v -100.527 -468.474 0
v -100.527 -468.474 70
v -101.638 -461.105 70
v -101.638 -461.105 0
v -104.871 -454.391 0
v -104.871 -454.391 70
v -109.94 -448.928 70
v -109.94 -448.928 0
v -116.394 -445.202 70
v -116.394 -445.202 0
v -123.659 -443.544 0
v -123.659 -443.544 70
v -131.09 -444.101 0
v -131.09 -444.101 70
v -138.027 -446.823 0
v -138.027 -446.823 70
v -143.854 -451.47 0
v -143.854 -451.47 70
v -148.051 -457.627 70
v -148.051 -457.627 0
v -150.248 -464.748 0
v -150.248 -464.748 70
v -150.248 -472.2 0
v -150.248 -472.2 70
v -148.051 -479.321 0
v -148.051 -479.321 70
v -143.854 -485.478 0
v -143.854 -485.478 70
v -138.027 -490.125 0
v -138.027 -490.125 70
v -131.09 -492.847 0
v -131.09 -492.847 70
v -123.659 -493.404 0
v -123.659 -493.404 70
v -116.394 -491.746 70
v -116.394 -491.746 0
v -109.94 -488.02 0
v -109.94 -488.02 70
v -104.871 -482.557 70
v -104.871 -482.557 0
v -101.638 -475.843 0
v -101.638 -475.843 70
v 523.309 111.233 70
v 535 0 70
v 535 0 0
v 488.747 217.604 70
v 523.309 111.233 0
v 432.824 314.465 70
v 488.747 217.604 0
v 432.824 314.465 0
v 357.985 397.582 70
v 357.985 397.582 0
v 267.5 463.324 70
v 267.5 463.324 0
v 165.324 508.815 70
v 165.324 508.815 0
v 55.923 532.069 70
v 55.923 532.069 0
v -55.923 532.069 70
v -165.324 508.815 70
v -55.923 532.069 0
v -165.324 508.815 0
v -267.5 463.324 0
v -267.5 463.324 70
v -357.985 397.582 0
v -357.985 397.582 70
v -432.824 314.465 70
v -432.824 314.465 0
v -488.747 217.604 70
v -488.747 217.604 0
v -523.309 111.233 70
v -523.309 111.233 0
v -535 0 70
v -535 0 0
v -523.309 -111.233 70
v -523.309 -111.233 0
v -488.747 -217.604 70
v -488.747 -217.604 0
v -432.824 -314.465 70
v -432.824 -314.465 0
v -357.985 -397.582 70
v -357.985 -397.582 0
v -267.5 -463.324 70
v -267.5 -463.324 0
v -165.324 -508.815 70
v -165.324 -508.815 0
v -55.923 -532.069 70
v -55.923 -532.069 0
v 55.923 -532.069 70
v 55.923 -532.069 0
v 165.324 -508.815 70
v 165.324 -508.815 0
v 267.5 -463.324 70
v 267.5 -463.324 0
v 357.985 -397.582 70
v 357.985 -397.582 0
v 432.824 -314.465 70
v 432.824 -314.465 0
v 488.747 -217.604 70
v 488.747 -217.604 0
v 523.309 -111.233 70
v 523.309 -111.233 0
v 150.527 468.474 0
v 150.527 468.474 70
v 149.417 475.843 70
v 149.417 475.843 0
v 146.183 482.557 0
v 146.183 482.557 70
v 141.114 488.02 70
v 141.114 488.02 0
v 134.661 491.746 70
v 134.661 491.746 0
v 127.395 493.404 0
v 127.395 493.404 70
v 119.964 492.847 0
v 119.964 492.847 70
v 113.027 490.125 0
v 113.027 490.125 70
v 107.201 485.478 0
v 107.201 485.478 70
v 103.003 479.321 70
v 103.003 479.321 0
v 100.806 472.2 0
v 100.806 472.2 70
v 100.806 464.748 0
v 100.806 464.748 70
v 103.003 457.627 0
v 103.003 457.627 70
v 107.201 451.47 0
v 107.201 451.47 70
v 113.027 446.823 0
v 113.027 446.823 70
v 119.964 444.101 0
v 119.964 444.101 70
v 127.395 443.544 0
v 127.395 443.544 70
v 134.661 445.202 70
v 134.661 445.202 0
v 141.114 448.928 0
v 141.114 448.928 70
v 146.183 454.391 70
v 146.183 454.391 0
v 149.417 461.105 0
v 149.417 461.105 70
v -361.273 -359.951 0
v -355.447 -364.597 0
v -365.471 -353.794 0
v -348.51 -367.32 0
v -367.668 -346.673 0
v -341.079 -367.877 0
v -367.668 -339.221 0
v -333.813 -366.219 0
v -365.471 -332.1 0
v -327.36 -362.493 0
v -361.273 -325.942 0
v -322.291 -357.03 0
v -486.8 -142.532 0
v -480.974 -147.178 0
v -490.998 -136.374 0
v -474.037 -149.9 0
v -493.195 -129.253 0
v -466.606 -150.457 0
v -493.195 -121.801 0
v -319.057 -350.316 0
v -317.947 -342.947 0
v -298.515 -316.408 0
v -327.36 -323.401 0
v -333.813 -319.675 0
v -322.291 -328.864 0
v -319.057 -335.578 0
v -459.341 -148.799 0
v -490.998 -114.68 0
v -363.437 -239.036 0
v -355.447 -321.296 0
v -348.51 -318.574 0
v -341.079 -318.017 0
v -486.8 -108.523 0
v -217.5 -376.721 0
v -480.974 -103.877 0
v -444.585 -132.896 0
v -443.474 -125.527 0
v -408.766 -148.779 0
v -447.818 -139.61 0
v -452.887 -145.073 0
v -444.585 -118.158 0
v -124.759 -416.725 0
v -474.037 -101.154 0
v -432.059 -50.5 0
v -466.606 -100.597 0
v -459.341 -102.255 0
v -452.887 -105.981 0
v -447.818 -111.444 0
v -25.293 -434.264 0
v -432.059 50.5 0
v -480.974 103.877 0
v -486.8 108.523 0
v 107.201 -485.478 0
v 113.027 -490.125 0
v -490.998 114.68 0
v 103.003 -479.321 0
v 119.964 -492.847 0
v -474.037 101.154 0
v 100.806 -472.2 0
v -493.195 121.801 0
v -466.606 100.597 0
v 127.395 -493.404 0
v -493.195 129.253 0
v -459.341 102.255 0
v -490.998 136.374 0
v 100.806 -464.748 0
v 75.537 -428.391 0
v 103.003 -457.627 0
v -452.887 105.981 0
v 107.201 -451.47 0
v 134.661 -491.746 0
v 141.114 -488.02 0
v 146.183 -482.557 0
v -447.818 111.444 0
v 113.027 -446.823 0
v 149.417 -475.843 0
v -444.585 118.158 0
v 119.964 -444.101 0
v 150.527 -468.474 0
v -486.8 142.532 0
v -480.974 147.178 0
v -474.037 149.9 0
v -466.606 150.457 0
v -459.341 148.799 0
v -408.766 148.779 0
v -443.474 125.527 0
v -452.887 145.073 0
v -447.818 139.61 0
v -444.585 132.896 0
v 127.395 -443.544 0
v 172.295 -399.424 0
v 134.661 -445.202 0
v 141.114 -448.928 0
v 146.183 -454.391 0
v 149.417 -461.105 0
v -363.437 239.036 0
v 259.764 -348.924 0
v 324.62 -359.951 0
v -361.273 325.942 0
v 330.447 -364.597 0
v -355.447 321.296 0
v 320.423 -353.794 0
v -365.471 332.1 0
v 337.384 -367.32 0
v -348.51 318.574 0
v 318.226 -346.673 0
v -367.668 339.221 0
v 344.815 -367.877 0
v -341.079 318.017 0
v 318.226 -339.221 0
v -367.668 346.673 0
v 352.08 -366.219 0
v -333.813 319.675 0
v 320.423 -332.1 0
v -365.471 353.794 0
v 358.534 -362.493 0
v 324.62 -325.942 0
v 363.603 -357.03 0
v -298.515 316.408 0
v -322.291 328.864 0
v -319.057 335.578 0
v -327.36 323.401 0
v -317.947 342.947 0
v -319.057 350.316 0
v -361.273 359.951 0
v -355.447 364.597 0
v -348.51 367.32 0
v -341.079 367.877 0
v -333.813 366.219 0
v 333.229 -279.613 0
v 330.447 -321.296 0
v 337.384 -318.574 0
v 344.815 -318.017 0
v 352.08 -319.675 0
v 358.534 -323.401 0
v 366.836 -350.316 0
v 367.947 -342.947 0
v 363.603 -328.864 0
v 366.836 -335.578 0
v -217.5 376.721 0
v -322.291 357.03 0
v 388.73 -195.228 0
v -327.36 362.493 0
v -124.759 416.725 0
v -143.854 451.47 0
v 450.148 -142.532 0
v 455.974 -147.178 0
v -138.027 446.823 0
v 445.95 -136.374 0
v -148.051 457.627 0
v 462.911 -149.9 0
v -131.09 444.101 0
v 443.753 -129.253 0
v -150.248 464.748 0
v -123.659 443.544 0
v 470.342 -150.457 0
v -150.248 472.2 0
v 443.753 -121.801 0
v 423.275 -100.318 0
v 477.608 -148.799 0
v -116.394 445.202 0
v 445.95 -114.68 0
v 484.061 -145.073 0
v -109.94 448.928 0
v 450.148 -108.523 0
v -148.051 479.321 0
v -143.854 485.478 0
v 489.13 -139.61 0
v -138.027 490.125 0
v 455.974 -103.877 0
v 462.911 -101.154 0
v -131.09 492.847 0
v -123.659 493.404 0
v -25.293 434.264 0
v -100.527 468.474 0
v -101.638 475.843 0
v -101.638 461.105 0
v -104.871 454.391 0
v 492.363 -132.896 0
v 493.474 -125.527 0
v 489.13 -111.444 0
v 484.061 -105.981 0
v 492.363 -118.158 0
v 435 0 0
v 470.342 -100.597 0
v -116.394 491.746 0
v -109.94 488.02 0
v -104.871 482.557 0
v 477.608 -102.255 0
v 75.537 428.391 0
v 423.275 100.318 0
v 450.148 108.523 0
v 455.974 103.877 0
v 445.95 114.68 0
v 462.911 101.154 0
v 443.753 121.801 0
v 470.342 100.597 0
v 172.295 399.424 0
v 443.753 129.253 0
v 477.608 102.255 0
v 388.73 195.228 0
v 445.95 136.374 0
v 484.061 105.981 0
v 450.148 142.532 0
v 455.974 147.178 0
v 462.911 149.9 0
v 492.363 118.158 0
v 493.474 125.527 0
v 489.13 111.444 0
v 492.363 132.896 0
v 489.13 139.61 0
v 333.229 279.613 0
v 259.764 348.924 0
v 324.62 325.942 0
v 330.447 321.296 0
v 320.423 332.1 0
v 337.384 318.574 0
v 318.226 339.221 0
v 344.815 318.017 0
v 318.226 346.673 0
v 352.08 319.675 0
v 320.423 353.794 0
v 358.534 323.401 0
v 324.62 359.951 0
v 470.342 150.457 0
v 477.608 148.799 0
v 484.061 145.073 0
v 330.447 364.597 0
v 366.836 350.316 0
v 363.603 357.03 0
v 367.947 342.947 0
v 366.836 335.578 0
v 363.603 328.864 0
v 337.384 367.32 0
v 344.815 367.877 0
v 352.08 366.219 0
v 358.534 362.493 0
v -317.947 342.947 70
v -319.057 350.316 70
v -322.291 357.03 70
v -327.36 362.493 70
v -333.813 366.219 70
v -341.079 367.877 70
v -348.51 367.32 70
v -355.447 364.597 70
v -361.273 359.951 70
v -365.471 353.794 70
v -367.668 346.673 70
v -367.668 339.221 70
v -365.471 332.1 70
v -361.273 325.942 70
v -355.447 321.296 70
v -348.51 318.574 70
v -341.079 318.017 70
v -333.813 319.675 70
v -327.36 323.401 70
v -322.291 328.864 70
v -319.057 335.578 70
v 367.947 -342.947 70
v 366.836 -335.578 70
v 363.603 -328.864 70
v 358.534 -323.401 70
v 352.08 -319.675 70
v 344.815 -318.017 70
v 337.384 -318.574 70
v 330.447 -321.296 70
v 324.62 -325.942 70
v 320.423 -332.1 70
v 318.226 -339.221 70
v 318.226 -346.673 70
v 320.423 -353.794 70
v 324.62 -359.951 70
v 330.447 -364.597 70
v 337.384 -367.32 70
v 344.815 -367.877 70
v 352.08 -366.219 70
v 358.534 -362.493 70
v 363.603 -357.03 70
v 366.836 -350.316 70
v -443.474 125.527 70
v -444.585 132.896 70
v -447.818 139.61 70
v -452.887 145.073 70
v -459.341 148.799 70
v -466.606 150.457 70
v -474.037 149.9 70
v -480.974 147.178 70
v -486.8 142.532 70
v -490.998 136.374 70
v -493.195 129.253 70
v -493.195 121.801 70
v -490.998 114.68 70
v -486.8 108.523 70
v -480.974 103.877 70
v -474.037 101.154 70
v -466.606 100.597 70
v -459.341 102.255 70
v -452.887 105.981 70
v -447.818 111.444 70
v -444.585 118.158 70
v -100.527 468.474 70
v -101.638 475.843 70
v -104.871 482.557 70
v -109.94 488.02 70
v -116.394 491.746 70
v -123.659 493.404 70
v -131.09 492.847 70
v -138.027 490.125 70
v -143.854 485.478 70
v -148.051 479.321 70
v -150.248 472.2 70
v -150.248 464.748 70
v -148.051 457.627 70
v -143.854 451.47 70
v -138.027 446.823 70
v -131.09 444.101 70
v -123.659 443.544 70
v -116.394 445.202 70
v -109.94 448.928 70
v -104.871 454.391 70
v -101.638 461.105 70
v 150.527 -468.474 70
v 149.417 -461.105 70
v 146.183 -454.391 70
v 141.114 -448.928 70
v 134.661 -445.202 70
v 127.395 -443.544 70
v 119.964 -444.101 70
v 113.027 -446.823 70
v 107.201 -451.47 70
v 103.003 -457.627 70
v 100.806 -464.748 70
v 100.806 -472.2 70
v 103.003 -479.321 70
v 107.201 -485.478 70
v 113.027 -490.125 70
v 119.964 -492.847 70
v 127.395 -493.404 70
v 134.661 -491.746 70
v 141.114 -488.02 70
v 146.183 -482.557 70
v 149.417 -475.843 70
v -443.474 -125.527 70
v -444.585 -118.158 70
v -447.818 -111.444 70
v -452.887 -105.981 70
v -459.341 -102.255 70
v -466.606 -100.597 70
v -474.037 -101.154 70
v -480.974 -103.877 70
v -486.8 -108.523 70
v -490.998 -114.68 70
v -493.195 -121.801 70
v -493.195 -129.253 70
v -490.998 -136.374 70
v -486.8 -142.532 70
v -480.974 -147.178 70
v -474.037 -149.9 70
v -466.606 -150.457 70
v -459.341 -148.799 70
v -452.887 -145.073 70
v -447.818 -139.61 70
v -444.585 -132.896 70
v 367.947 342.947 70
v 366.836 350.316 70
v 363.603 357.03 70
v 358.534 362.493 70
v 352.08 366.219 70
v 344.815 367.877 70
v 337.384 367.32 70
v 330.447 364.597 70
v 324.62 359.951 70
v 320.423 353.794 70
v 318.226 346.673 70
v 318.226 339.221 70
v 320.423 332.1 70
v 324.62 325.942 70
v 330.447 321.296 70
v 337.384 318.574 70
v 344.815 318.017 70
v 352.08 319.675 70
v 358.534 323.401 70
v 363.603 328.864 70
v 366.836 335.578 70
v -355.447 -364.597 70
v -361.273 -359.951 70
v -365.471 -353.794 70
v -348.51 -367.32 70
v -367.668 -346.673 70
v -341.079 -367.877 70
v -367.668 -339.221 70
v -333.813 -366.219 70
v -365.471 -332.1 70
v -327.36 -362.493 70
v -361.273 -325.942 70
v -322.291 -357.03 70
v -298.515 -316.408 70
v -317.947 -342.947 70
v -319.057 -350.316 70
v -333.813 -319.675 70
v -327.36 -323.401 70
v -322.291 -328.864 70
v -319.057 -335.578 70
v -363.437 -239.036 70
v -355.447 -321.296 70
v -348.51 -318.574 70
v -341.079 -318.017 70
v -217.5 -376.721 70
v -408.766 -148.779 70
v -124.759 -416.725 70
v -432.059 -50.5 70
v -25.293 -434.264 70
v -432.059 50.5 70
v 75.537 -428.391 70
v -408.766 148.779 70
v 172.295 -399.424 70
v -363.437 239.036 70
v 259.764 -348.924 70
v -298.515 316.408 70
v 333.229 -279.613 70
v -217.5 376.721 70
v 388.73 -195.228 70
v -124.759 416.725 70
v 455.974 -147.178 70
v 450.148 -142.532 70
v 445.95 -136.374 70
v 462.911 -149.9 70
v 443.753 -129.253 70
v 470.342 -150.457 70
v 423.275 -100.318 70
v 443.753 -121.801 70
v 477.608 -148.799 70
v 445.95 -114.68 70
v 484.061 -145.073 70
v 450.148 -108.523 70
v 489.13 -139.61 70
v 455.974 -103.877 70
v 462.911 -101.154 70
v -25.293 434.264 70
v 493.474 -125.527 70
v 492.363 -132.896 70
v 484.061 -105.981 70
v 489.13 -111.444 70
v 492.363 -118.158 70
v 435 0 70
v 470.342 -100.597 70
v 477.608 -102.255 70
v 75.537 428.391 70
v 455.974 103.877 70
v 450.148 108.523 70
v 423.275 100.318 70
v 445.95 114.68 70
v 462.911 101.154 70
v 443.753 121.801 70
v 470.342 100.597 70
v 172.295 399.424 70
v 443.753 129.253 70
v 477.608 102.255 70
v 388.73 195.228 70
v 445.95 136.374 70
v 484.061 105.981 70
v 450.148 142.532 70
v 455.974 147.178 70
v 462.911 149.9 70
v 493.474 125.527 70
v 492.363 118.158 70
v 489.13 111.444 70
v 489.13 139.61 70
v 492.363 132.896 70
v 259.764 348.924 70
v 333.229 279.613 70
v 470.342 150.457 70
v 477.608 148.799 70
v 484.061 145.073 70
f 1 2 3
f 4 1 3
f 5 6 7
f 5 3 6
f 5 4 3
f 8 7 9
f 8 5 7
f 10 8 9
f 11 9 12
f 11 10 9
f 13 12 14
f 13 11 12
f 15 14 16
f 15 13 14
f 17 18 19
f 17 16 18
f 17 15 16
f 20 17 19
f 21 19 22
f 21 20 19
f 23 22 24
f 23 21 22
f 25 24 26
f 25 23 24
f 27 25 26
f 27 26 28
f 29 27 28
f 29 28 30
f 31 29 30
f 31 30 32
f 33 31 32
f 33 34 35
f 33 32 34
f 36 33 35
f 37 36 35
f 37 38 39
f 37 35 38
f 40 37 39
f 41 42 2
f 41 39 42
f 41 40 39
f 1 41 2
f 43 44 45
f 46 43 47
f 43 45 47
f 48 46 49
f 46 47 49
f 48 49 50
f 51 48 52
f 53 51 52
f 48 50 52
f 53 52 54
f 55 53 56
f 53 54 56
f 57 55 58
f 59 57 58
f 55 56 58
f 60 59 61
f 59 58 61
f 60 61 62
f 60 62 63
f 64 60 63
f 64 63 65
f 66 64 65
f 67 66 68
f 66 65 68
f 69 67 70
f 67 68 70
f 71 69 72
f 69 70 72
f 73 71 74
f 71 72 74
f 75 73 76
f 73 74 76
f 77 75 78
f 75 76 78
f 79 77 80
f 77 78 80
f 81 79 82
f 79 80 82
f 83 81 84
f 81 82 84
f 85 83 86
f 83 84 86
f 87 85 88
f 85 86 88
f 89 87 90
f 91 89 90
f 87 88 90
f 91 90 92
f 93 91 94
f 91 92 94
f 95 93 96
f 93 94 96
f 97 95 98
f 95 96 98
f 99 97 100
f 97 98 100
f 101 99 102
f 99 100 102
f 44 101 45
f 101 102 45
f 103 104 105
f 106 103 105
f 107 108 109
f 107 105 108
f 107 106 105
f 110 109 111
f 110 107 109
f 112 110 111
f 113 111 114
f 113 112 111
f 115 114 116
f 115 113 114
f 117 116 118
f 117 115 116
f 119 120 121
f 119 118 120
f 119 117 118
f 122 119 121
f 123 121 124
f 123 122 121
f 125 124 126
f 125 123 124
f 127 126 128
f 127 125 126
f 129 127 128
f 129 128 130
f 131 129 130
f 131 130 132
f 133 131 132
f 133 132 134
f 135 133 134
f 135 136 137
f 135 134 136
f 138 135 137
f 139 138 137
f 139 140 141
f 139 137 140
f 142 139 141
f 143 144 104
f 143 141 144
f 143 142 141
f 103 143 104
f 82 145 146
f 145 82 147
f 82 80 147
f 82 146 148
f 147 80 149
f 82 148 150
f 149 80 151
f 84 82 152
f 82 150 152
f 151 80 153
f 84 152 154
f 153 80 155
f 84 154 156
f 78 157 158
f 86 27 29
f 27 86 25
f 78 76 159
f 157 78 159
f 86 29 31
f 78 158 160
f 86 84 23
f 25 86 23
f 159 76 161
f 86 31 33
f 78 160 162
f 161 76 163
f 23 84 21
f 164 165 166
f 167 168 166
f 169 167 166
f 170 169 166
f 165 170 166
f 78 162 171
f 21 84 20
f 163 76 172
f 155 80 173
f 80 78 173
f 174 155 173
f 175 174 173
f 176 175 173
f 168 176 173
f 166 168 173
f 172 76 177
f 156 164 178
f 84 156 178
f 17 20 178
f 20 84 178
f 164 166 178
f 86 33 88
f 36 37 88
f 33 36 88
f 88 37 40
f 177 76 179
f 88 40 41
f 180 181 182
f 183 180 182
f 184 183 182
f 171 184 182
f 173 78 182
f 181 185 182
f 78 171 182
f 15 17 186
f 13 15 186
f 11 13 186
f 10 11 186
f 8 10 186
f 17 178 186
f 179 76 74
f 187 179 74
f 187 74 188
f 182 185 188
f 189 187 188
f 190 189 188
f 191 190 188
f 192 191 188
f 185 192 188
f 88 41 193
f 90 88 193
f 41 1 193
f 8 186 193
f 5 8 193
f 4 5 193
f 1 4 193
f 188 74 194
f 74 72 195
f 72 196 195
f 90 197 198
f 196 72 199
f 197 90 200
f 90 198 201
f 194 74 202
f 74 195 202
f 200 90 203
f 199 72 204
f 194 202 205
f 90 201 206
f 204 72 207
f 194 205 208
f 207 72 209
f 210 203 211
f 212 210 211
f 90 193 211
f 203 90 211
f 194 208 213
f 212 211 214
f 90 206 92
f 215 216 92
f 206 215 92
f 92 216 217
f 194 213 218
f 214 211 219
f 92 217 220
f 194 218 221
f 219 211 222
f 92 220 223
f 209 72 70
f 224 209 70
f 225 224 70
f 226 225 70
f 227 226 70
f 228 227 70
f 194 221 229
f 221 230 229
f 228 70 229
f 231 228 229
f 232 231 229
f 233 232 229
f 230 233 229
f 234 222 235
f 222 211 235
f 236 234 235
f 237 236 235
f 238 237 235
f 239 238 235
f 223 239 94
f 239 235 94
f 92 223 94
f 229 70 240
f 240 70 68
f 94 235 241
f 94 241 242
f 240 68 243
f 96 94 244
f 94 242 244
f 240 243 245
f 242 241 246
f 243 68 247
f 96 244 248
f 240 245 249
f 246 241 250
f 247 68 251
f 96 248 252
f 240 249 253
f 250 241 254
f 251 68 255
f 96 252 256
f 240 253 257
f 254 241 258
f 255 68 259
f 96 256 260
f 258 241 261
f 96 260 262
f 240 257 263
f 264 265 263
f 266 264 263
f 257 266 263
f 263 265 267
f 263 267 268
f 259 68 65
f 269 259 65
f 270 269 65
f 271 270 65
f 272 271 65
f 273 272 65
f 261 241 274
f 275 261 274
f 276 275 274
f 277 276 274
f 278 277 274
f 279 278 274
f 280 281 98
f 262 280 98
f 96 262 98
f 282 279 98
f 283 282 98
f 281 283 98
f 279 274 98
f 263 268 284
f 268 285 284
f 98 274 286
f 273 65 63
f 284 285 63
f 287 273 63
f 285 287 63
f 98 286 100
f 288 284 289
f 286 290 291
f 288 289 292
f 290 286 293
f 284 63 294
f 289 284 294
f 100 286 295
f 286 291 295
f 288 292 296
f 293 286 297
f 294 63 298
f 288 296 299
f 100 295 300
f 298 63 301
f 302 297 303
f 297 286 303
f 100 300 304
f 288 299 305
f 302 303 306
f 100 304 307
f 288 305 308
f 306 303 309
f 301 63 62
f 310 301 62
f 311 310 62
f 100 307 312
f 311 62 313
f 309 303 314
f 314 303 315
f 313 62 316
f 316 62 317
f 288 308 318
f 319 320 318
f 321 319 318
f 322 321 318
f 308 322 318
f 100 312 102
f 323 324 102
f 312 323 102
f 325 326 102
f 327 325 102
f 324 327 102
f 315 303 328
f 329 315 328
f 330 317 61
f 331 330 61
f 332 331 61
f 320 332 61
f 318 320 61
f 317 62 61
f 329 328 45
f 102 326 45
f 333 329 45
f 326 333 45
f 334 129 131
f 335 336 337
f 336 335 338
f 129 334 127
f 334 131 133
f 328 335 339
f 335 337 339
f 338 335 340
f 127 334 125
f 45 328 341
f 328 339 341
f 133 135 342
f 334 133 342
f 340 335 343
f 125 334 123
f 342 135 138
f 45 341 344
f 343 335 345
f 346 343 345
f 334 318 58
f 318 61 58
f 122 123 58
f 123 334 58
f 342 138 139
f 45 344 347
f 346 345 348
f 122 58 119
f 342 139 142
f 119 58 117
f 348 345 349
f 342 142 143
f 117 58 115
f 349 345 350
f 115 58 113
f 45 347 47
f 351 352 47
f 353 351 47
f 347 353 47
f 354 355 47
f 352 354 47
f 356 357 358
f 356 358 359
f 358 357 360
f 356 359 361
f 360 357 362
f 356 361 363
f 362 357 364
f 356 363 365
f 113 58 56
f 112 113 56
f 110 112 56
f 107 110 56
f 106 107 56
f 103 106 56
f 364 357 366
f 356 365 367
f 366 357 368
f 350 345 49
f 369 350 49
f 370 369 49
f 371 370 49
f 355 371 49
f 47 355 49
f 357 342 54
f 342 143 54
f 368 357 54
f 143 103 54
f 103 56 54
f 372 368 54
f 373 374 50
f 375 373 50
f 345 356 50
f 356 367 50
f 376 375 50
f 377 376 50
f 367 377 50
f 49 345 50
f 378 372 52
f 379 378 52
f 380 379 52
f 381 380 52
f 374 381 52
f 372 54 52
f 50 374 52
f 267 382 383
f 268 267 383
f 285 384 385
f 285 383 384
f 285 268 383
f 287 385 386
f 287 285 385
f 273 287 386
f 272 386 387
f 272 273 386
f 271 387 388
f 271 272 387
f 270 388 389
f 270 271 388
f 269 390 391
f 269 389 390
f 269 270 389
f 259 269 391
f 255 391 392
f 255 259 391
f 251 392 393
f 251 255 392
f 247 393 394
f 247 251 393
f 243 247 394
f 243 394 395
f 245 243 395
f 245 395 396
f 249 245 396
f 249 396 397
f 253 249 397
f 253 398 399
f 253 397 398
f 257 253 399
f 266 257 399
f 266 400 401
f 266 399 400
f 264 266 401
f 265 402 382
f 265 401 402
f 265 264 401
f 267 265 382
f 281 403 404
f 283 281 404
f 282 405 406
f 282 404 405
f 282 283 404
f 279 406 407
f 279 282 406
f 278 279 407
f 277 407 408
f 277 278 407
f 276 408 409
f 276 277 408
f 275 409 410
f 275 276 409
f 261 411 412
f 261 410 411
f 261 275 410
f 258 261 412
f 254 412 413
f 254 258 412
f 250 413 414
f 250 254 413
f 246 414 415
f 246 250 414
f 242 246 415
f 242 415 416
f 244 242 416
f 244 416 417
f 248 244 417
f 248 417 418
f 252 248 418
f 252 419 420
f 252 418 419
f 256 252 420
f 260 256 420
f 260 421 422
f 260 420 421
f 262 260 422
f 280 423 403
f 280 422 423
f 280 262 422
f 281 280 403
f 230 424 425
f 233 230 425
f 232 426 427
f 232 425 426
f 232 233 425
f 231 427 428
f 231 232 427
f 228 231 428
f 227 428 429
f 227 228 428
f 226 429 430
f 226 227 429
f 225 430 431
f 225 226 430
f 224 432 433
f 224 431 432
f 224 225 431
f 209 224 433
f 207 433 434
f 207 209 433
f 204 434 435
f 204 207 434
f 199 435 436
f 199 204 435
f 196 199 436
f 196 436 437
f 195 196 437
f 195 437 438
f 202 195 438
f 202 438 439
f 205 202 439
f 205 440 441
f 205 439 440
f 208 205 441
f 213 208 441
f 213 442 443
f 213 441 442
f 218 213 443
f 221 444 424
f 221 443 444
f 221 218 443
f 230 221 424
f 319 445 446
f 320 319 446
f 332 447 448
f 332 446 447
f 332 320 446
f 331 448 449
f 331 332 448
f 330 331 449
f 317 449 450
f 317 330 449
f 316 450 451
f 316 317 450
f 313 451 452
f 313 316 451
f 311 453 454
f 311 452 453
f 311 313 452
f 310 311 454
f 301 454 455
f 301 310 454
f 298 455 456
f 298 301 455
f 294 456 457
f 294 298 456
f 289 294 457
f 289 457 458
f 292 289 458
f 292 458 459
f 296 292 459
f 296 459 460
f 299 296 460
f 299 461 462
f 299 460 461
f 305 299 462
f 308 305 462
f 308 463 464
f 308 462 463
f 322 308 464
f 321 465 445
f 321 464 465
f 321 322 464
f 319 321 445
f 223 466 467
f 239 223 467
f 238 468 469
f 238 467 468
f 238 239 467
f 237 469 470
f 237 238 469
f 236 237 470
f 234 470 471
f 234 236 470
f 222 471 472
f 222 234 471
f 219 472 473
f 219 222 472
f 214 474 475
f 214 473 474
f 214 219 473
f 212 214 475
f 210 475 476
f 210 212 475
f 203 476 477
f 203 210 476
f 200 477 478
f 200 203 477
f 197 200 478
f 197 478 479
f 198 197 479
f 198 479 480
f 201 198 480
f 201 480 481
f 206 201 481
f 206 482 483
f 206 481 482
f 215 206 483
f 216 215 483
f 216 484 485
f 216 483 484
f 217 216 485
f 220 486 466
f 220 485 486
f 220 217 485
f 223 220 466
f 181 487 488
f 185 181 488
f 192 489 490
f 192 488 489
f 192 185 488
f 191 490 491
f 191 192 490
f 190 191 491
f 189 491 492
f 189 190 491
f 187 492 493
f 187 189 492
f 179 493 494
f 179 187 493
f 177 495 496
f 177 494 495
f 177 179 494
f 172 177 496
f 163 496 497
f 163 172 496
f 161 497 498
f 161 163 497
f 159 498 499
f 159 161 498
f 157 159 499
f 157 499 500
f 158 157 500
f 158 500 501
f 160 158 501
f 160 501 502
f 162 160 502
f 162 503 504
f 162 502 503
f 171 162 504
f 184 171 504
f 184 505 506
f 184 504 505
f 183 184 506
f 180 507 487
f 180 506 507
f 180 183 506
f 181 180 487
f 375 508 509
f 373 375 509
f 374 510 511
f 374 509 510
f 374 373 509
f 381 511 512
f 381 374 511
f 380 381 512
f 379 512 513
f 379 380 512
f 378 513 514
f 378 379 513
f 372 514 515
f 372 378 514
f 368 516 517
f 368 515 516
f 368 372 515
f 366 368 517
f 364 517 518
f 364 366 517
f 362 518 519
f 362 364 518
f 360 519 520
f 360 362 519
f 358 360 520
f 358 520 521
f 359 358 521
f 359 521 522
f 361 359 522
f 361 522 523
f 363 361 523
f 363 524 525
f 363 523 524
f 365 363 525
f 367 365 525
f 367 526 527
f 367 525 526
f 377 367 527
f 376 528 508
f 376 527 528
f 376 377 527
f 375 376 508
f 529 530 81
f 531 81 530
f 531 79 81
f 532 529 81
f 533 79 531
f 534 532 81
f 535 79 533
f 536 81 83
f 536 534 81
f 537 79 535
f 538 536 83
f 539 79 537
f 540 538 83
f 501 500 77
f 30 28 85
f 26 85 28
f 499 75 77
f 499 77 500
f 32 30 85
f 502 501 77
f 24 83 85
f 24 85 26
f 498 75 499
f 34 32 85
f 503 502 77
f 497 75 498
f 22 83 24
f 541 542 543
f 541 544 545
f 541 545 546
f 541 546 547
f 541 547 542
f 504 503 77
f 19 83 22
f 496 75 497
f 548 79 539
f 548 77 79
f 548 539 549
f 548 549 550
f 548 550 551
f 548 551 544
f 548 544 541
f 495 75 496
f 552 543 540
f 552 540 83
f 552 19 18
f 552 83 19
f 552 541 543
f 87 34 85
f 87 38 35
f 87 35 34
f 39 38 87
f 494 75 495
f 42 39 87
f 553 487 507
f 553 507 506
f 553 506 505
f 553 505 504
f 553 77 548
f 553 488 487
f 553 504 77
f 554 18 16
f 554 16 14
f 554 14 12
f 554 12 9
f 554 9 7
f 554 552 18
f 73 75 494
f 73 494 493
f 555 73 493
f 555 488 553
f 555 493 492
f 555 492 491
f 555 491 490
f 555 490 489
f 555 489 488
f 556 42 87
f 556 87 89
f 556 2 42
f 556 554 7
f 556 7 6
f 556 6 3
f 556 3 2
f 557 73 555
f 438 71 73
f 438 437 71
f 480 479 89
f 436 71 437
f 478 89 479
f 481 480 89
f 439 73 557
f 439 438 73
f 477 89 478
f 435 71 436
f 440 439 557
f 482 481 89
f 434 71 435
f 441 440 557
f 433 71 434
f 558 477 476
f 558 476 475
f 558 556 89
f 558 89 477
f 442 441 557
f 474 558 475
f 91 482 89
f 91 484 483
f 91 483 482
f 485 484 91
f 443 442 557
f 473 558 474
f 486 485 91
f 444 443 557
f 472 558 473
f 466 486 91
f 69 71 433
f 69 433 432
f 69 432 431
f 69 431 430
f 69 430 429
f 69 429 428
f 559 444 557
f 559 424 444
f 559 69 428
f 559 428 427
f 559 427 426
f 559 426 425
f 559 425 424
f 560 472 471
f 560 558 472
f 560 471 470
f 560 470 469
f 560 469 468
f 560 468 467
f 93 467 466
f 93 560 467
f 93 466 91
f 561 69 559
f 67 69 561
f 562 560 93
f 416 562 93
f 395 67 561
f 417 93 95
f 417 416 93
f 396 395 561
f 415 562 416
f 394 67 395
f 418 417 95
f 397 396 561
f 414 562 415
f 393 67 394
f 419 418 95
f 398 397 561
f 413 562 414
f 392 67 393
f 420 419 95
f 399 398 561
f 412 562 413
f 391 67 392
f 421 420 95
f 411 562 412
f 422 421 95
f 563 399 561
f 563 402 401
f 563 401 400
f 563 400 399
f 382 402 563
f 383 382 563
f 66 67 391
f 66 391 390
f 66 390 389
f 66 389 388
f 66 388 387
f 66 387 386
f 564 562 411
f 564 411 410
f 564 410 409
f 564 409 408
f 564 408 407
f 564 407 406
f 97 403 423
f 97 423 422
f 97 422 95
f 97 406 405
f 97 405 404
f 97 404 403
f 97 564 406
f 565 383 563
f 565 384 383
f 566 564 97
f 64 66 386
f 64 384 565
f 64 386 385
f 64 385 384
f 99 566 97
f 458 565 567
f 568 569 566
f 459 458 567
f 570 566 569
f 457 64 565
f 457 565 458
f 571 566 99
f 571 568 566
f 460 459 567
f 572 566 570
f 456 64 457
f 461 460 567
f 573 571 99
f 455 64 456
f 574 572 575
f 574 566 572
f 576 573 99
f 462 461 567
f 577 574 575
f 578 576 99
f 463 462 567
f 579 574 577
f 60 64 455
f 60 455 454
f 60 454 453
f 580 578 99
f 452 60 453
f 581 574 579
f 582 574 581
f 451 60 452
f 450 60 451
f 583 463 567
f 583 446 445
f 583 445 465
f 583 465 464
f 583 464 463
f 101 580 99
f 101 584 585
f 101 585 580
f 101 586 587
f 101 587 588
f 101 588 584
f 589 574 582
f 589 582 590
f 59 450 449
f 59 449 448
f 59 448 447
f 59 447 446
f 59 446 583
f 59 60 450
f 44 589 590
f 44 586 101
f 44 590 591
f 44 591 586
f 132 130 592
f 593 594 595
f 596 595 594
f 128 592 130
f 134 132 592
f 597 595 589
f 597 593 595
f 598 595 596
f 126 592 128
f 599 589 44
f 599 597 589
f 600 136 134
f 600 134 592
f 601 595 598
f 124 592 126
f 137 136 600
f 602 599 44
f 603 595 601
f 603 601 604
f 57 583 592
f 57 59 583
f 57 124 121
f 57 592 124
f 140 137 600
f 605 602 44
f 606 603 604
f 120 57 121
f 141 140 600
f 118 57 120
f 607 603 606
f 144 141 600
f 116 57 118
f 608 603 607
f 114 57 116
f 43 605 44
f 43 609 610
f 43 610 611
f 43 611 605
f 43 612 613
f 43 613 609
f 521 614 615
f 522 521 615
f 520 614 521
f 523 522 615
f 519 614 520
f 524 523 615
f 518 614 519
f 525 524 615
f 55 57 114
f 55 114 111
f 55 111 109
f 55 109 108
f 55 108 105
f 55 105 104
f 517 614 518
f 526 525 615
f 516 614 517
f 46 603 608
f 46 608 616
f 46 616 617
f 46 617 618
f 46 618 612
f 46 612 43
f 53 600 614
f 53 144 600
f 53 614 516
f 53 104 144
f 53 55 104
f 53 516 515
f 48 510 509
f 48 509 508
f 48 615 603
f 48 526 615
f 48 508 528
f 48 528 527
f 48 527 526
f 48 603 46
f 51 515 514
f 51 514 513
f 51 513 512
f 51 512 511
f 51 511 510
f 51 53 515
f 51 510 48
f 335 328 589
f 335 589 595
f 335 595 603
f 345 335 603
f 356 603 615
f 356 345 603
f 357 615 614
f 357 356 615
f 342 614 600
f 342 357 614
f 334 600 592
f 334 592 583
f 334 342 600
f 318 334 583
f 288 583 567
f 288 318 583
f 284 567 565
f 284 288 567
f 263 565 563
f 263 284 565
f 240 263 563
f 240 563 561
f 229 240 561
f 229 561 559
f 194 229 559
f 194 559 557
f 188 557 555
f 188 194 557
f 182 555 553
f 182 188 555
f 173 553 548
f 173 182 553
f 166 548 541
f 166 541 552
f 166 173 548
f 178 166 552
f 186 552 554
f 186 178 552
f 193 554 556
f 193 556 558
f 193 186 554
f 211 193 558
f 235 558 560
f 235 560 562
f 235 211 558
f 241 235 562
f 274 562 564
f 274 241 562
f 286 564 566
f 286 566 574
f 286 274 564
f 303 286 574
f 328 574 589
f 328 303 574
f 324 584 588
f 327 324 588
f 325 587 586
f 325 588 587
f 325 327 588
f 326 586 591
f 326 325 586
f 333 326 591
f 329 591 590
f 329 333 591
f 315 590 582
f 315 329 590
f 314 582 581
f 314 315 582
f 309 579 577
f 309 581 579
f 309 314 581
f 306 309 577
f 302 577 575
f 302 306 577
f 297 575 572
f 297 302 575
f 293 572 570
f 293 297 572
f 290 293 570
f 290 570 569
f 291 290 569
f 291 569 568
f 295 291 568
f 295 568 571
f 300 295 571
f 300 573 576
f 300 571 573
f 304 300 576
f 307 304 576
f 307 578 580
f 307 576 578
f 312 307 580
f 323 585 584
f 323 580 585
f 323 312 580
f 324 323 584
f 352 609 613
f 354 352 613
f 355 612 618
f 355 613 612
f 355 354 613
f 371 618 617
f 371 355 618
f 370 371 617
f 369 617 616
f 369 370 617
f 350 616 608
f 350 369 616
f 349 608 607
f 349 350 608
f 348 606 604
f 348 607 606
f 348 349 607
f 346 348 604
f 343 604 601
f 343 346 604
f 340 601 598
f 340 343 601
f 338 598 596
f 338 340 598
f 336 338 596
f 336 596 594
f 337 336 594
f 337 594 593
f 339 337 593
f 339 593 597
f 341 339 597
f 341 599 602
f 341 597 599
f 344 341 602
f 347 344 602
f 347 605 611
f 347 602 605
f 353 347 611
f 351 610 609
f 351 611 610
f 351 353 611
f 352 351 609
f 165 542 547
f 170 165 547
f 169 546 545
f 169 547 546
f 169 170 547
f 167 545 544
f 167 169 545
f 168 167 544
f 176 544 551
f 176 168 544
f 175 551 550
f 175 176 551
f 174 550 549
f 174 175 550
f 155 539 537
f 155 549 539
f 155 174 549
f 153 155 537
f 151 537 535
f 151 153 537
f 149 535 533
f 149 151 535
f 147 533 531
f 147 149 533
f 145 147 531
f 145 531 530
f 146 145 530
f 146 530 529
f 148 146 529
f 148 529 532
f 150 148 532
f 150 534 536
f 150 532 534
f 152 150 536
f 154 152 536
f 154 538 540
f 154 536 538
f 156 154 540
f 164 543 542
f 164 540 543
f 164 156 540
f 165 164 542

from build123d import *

# Parameters (mm, degrees)
SKETCH1_R               = 535
SKETCH1_R_2             = 435
BOSS_EXTRUDE1_DEPTH     = 70
CUT_EXTRUDE2_DEPTH      = 760.835508515
CUT_EXTRUDE2_DEPTH_BACK = 760.835508515
SKETCH3_R               = 25


with BuildPart() as part:
    # Sketch1 → Boss-Extrude1 (new body)
    with BuildSketch(Plane.XY):
        Circle(SKETCH1_R)
        Circle(SKETCH1_R_2, mode=Mode.SUBTRACT)
    extrude(amount=BOSS_EXTRUDE1_DEPTH)

    # Sketch3 → Cut-Extrude2 (cut, two sides: drawn at the far end of the back side and taken through both)
    with BuildSketch(Plane.XY.offset(70).offset(-CUT_EXTRUDE2_DEPTH_BACK)):
        with Locations((125.527236875, 468.47402575)):
            Circle(SKETCH3_R)
        with Locations((342.946788875, 342.946788875)):
            Circle(SKETCH3_R)
        with Locations((468.47402575, 125.527236875)):
            Circle(SKETCH3_R)
        with Locations((468.47402575, -125.527236875)):
            Circle(SKETCH3_R)
        with Locations((342.946788875, -342.946788876)):
            Circle(SKETCH3_R)
        with Locations((125.527236875, -468.47402575)):
            Circle(SKETCH3_R)
        with Locations((-125.527236875, -468.47402575)):
            Circle(SKETCH3_R)
        with Locations((-342.946788876, -342.946788875)):
            Circle(SKETCH3_R)
        with Locations((-468.47402575, -125.527236875)):
            Circle(SKETCH3_R)
        with Locations((-468.47402575, 125.527236875)):
            Circle(SKETCH3_R)
        with Locations((-342.946788875, 342.946788876)):
            Circle(SKETCH3_R)
        with Locations((-125.527236875, 468.47402575)):
            Circle(SKETCH3_R)
    extrude(amount=CUT_EXTRUDE2_DEPTH + CUT_EXTRUDE2_DEPTH_BACK, mode=Mode.SUBTRACT)


solid = part.part
